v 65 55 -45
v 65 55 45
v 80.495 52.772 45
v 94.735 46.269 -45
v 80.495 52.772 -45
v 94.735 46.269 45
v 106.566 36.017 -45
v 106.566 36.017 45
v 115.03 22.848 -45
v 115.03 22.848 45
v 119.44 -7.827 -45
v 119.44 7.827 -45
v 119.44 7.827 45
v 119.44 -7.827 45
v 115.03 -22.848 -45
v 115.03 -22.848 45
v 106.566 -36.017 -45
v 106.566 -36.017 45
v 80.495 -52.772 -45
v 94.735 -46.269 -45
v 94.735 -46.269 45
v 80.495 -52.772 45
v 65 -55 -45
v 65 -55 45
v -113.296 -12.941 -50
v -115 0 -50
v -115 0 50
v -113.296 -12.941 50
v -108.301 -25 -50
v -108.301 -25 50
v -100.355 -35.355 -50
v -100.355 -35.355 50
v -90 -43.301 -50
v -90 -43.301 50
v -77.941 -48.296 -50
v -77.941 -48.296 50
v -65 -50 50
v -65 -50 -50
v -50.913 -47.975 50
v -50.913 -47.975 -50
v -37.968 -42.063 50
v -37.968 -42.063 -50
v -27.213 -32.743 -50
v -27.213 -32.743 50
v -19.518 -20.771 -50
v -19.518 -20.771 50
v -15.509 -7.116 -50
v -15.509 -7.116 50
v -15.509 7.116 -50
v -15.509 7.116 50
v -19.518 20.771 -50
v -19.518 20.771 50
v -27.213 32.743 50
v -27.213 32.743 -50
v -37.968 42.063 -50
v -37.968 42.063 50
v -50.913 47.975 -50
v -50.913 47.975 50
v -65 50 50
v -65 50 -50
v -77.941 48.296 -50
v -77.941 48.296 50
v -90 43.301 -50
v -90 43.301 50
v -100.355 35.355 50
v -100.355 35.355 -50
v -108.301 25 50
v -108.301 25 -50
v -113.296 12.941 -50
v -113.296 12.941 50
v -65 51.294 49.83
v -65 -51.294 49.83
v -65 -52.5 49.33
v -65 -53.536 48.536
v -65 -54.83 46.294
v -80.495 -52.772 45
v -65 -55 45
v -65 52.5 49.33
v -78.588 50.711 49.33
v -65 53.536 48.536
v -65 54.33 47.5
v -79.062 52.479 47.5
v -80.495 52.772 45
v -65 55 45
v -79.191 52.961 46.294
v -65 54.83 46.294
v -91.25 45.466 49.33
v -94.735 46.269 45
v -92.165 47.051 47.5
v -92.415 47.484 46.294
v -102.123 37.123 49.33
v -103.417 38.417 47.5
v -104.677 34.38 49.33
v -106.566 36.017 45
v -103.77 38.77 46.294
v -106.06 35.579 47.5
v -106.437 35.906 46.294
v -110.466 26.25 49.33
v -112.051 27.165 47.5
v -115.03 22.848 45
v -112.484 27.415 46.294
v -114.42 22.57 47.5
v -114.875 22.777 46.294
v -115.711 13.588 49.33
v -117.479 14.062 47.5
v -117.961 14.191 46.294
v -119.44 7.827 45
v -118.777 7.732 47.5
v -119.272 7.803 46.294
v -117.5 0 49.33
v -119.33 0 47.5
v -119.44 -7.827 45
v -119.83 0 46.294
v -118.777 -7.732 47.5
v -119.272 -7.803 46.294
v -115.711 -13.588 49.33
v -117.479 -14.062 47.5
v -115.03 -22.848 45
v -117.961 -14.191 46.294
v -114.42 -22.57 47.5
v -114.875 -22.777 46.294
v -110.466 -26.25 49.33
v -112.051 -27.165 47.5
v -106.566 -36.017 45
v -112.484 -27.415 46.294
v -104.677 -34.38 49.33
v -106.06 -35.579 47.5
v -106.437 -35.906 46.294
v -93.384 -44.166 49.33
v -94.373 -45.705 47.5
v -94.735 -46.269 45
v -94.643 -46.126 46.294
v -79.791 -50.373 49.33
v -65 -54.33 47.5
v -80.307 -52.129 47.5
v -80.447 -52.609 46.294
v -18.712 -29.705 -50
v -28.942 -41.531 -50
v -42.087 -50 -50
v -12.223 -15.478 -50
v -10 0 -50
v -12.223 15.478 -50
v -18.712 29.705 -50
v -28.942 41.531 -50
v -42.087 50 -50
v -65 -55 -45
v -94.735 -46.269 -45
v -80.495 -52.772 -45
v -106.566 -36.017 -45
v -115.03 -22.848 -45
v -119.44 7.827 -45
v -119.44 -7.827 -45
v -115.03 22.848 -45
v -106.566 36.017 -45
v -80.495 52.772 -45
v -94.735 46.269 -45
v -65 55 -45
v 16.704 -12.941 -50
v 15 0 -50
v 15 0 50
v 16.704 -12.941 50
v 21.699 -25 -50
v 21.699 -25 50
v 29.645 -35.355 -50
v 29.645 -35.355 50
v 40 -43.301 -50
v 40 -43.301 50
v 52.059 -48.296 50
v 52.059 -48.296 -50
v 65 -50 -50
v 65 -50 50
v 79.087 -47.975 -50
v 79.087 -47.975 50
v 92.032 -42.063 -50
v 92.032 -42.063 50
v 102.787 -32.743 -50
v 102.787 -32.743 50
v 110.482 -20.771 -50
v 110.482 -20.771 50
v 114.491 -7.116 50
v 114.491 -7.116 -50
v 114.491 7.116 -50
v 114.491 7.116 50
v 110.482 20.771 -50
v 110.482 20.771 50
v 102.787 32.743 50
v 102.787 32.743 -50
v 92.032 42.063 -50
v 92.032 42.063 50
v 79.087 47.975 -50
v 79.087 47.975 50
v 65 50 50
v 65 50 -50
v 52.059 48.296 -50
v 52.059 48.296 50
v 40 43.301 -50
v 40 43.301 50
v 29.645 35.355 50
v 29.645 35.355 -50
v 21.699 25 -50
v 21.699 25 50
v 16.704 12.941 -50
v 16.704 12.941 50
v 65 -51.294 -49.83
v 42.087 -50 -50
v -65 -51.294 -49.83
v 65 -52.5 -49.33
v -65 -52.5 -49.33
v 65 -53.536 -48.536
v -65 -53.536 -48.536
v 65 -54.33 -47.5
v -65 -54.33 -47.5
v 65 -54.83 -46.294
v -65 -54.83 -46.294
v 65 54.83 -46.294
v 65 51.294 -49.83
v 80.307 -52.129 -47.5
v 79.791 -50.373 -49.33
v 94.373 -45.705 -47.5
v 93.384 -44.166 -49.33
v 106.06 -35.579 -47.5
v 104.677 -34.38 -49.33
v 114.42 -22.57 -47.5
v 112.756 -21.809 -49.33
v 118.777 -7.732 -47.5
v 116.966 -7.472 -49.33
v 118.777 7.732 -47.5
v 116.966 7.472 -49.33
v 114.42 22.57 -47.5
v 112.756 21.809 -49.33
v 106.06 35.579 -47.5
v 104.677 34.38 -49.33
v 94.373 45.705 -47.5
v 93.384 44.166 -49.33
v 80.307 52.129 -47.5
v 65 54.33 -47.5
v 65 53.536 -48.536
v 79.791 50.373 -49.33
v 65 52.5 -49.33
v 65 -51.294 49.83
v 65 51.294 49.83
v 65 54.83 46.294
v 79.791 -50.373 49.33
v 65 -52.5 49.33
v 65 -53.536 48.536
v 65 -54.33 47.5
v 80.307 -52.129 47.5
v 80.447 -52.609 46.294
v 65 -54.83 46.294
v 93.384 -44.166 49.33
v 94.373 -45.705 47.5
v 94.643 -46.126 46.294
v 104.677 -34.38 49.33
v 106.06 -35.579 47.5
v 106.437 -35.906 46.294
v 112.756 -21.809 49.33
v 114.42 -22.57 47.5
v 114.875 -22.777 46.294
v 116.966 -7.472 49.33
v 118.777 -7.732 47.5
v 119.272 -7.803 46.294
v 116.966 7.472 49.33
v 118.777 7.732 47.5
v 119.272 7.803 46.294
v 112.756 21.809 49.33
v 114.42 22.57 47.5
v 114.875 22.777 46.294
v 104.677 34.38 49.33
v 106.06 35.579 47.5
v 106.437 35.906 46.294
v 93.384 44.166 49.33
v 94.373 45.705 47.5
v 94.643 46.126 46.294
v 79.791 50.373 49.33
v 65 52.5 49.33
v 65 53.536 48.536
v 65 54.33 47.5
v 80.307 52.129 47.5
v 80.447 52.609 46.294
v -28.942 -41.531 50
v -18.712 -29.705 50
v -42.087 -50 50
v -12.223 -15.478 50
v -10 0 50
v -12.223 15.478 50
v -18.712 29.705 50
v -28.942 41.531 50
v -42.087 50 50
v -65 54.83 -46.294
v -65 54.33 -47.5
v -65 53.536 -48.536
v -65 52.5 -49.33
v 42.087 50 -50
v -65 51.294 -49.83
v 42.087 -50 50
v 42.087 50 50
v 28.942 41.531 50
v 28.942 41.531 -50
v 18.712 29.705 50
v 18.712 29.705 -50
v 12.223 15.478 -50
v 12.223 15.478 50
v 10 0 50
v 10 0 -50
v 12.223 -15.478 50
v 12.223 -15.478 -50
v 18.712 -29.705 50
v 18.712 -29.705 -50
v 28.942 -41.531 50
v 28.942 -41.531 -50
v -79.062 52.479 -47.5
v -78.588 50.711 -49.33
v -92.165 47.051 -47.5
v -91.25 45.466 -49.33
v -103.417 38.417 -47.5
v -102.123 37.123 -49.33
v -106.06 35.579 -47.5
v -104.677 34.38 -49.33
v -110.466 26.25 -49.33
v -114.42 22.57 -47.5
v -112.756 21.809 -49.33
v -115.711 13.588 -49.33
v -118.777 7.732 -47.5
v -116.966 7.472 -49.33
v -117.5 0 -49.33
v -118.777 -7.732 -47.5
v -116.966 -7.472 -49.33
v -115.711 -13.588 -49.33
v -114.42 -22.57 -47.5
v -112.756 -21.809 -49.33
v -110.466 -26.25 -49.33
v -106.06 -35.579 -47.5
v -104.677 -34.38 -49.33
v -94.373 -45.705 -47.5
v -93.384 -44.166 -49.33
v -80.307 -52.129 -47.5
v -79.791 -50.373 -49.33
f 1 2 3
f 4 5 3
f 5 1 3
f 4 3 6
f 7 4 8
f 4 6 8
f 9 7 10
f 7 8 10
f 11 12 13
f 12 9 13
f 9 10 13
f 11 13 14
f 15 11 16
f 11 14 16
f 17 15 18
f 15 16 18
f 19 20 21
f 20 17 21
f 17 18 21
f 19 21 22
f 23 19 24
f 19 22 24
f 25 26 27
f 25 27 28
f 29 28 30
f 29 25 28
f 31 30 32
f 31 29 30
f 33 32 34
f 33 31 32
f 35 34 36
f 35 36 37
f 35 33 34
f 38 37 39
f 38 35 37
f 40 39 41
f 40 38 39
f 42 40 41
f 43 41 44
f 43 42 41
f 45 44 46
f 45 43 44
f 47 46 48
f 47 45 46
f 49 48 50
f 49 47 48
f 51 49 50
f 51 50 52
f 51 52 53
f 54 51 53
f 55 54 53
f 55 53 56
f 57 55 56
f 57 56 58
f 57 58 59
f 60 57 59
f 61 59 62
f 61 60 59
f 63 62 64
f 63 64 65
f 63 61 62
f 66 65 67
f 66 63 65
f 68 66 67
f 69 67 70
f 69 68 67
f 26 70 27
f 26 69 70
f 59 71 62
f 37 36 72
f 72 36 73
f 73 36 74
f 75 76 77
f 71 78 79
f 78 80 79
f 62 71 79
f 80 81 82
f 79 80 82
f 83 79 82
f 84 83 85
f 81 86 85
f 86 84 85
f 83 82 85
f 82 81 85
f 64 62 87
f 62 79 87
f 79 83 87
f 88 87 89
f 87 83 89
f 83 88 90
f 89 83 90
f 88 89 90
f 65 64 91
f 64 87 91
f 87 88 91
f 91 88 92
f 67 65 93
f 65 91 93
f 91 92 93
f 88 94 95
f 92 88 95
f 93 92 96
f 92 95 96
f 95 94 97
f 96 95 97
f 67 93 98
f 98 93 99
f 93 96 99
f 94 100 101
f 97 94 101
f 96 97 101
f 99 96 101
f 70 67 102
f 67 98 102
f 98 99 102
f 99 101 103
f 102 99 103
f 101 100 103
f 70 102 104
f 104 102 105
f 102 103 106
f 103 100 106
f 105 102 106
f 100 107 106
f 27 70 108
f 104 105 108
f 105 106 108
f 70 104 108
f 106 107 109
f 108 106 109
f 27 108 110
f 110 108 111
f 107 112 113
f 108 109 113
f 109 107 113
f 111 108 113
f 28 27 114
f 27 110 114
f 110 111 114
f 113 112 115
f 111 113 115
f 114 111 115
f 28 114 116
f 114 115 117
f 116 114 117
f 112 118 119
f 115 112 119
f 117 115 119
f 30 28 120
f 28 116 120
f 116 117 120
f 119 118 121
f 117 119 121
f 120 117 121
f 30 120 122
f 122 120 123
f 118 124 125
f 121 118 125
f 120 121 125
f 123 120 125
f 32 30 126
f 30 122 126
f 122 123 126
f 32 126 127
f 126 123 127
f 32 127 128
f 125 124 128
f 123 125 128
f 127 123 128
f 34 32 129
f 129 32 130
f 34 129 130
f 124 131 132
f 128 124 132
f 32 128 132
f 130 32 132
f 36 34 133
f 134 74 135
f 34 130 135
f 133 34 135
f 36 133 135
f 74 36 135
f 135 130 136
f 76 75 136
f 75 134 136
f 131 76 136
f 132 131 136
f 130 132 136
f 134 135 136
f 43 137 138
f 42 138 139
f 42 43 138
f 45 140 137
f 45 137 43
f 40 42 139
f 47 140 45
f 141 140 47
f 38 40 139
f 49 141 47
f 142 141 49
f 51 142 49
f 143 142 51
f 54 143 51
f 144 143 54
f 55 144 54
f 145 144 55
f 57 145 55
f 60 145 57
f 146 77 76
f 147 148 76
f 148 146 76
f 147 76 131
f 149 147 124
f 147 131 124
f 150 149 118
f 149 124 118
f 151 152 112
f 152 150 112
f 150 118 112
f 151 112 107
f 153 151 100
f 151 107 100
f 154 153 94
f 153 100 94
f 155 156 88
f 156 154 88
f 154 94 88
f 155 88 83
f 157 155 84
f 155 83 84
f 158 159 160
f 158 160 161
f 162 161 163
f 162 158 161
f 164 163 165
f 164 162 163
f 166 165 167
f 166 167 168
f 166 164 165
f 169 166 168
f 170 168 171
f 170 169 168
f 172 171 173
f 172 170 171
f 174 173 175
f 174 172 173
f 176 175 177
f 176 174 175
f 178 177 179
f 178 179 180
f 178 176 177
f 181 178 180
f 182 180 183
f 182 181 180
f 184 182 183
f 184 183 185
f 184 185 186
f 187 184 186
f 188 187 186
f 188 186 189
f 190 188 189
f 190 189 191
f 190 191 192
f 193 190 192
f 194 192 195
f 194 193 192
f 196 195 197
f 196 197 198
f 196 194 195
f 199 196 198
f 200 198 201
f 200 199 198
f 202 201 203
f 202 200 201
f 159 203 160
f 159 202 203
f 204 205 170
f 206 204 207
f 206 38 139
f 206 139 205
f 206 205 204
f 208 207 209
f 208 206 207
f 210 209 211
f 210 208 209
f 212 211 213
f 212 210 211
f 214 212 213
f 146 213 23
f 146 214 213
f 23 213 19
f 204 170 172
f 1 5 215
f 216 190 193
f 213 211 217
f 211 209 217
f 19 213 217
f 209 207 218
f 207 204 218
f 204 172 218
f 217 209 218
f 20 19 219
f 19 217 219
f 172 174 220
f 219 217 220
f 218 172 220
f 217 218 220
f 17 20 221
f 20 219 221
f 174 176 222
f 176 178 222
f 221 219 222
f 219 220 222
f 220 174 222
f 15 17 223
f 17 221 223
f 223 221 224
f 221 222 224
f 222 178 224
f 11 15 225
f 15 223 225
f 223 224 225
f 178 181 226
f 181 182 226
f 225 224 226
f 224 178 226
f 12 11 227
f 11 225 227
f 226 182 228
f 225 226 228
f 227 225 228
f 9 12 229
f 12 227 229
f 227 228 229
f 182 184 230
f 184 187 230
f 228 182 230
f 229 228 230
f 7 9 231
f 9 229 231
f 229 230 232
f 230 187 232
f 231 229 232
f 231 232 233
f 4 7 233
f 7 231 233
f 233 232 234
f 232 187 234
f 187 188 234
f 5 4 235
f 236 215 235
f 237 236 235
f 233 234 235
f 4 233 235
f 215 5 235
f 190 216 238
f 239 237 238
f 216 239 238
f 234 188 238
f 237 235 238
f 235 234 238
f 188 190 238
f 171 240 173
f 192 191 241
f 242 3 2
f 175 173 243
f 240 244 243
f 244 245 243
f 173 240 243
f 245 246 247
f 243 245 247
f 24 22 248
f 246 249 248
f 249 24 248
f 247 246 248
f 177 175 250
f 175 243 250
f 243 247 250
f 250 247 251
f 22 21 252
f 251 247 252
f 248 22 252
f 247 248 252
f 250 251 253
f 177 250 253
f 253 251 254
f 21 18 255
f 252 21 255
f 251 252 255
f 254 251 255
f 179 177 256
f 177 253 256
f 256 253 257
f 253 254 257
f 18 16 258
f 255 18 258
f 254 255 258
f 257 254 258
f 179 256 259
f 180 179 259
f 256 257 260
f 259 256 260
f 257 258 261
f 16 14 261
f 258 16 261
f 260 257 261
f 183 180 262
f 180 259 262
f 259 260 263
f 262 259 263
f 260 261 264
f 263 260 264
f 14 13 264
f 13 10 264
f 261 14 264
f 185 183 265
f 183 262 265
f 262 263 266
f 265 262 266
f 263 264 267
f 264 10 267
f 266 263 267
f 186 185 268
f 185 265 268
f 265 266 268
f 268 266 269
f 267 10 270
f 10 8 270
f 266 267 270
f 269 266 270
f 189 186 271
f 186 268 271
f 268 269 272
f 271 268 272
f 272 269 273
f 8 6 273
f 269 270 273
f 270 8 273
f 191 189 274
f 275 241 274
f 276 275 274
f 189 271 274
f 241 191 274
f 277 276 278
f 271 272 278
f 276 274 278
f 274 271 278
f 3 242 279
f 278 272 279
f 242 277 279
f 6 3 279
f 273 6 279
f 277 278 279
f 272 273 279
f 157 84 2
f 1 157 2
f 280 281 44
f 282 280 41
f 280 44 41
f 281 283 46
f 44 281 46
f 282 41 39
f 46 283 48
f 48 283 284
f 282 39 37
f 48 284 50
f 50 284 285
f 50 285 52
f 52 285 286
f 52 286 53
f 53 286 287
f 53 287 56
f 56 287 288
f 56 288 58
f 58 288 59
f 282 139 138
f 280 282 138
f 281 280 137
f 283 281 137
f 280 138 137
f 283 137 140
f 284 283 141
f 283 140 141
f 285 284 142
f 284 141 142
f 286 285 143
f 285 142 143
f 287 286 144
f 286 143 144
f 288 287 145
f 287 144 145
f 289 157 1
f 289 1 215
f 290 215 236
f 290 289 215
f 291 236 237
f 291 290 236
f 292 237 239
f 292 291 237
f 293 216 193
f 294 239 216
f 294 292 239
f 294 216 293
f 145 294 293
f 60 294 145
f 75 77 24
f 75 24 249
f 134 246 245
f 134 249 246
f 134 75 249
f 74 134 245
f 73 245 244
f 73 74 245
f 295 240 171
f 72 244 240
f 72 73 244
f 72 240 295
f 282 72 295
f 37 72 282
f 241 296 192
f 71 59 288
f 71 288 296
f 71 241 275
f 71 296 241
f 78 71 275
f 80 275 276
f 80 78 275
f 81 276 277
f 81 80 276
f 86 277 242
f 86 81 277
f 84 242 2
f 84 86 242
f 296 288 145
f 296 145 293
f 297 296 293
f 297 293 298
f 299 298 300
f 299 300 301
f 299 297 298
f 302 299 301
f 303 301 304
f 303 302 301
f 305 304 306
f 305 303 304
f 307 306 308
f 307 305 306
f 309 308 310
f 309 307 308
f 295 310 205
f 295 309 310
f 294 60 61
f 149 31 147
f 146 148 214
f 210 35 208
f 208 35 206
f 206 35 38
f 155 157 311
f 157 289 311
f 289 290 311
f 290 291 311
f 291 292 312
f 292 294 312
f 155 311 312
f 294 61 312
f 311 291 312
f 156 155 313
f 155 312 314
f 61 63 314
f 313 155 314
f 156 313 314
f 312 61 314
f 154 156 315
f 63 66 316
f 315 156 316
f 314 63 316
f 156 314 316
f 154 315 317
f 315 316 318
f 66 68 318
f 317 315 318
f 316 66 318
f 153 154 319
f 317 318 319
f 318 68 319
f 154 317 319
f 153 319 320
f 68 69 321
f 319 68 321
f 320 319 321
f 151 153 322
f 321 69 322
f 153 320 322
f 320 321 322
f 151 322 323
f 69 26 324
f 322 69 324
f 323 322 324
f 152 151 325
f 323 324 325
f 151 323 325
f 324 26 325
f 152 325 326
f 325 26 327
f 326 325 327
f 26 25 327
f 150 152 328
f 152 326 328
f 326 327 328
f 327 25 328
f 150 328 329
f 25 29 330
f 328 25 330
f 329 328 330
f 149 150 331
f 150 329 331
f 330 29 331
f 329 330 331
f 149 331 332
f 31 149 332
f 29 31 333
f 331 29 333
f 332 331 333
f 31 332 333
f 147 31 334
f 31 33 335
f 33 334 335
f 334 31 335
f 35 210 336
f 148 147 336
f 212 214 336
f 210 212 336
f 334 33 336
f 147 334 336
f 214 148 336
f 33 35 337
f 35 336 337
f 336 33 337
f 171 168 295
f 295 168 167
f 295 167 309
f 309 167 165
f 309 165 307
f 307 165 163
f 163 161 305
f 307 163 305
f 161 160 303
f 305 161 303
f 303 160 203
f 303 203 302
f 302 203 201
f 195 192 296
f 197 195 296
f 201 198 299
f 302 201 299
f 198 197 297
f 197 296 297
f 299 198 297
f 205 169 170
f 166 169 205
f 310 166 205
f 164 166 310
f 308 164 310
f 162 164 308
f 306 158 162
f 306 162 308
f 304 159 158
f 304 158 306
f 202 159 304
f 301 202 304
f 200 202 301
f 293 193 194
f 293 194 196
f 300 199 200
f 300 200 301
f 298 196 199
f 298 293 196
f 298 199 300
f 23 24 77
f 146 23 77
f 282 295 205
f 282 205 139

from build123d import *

# Parameters (mm, degrees)
SKETCH1_R           = 50
BOSS_EXTRUDE1_DEPTH = 50
FILLET1_START       = -120
FILLET1_DEPTH       = 240
FILLET1_2_ANGLE     = 180
FILLET1_3_ANGLE     = 180


with BuildPart() as part:
    # Sketch1 → Boss-Extrude1 (new, symmetric)
    with BuildSketch(Plane.XY):
        with BuildLine():
            Line((-65, 55), (65, 55))
            ThreePointArc((65, 55), (120, 0), (65, -55))
            Line((65, -55), (-65, -55))
            ThreePointArc((-65, -55), (-120, 0), (-65, 55))
        make_face()
        with Locations(Location((-65, 0, 0), (0, 0, 180))):
            Circle(SKETCH1_R, mode=Mode.SUBTRACT)
        with Locations(Location((65, 0, 0), (0, 0, 180))):
            Circle(SKETCH1_R, mode=Mode.SUBTRACT)
        with BuildLine():
            Line((-42.087121525, 50), (42.087121525, 50))
            ThreePointArc((42.087121525, 50), (10, 0), (42.087121525, -50))
            Line((42.087121525, -50), (-42.087121525, -50))
            ThreePointArc((-42.087121525, -50), (-10, 0), (-42.087121525, 50))
        make_face(mode=Mode.SUBTRACT)
    extrude(amount=BOSS_EXTRUDE1_DEPTH, both=True)

    # Fillet1: read off the stored shape, not the designer's step
    # Fillet1 outline → Fillet1 (cut)
    with BuildSketch(Plane.YZ.offset(FILLET1_START)):
        with BuildLine():
            Line((55, -50), (55, -45))
            ThreePointArc((55, -45), (53.535533906, -48.535533906), (50, -50))
            Line((50, -50), (55, -50))
        make_face()
        with BuildLine():
            ThreePointArc((50, 50), (53.535533906, 48.535533906), (55, 45))
            Line((55, 45), (55, 50))
            Line((55, 50), (50, 50))
        make_face()
        with BuildLine():
            Line((-55, -50), (-50, -50))
            ThreePointArc((-50, -50), (-53.535533906, -48.535533906), (-55, -45))
            Line((-55, -45), (-55, -50))
        make_face()
        with BuildLine():
            ThreePointArc((-55, 45), (-53.535533906, 48.535533906), (-50, 50))
            Line((-50, 50), (-55, 50))
            Line((-55, 50), (-55, 45))
        make_face()
    extrude(amount=FILLET1_DEPTH, mode=Mode.SUBTRACT)

    # Fillet1 2 outline → Fillet1 2 (revolve, cut)
    with BuildSketch(Plane(origin=(65, 0, 0), x_dir=(0, -1, 0), z_dir=(-1, 0, 0))):
        with BuildLine():
            ThreePointArc((55, -45), (53.535533906, -48.535533906), (50, -50))
            Line((50, -50), (55, -50))
            Line((55, -50), (55, -45))
        make_face()
        with BuildLine():
            ThreePointArc((50, 50), (53.535533906, 48.535533906), (55, 45))
            Line((55, 45), (55, 50))
            Line((55, 50), (50, 50))
        make_face()
    revolve(axis=Axis((65, 0, 0), (0, 0, 1)), revolution_arc=FILLET1_2_ANGLE, mode=Mode.SUBTRACT)

    # Fillet1 3 outline → Fillet1 3 (revolve, cut)
    with BuildSketch(Plane.YZ.offset(-65)):
        with BuildLine():
            ThreePointArc((55, -45), (53.535533906, -48.535533906), (50, -50))
            Line((50, -50), (55, -50))
            Line((55, -50), (55, -45))
        make_face()
        with BuildLine():
            ThreePointArc((50, 50), (53.535533906, 48.535533906), (55, 45))
            Line((55, 45), (55, 50))
            Line((55, 50), (50, 50))
        make_face()
    revolve(axis=Axis((-65, 0, 0), (0, 0, 1)), revolution_arc=FILLET1_3_ANGLE, mode=Mode.SUBTRACT)


solid = part.part
